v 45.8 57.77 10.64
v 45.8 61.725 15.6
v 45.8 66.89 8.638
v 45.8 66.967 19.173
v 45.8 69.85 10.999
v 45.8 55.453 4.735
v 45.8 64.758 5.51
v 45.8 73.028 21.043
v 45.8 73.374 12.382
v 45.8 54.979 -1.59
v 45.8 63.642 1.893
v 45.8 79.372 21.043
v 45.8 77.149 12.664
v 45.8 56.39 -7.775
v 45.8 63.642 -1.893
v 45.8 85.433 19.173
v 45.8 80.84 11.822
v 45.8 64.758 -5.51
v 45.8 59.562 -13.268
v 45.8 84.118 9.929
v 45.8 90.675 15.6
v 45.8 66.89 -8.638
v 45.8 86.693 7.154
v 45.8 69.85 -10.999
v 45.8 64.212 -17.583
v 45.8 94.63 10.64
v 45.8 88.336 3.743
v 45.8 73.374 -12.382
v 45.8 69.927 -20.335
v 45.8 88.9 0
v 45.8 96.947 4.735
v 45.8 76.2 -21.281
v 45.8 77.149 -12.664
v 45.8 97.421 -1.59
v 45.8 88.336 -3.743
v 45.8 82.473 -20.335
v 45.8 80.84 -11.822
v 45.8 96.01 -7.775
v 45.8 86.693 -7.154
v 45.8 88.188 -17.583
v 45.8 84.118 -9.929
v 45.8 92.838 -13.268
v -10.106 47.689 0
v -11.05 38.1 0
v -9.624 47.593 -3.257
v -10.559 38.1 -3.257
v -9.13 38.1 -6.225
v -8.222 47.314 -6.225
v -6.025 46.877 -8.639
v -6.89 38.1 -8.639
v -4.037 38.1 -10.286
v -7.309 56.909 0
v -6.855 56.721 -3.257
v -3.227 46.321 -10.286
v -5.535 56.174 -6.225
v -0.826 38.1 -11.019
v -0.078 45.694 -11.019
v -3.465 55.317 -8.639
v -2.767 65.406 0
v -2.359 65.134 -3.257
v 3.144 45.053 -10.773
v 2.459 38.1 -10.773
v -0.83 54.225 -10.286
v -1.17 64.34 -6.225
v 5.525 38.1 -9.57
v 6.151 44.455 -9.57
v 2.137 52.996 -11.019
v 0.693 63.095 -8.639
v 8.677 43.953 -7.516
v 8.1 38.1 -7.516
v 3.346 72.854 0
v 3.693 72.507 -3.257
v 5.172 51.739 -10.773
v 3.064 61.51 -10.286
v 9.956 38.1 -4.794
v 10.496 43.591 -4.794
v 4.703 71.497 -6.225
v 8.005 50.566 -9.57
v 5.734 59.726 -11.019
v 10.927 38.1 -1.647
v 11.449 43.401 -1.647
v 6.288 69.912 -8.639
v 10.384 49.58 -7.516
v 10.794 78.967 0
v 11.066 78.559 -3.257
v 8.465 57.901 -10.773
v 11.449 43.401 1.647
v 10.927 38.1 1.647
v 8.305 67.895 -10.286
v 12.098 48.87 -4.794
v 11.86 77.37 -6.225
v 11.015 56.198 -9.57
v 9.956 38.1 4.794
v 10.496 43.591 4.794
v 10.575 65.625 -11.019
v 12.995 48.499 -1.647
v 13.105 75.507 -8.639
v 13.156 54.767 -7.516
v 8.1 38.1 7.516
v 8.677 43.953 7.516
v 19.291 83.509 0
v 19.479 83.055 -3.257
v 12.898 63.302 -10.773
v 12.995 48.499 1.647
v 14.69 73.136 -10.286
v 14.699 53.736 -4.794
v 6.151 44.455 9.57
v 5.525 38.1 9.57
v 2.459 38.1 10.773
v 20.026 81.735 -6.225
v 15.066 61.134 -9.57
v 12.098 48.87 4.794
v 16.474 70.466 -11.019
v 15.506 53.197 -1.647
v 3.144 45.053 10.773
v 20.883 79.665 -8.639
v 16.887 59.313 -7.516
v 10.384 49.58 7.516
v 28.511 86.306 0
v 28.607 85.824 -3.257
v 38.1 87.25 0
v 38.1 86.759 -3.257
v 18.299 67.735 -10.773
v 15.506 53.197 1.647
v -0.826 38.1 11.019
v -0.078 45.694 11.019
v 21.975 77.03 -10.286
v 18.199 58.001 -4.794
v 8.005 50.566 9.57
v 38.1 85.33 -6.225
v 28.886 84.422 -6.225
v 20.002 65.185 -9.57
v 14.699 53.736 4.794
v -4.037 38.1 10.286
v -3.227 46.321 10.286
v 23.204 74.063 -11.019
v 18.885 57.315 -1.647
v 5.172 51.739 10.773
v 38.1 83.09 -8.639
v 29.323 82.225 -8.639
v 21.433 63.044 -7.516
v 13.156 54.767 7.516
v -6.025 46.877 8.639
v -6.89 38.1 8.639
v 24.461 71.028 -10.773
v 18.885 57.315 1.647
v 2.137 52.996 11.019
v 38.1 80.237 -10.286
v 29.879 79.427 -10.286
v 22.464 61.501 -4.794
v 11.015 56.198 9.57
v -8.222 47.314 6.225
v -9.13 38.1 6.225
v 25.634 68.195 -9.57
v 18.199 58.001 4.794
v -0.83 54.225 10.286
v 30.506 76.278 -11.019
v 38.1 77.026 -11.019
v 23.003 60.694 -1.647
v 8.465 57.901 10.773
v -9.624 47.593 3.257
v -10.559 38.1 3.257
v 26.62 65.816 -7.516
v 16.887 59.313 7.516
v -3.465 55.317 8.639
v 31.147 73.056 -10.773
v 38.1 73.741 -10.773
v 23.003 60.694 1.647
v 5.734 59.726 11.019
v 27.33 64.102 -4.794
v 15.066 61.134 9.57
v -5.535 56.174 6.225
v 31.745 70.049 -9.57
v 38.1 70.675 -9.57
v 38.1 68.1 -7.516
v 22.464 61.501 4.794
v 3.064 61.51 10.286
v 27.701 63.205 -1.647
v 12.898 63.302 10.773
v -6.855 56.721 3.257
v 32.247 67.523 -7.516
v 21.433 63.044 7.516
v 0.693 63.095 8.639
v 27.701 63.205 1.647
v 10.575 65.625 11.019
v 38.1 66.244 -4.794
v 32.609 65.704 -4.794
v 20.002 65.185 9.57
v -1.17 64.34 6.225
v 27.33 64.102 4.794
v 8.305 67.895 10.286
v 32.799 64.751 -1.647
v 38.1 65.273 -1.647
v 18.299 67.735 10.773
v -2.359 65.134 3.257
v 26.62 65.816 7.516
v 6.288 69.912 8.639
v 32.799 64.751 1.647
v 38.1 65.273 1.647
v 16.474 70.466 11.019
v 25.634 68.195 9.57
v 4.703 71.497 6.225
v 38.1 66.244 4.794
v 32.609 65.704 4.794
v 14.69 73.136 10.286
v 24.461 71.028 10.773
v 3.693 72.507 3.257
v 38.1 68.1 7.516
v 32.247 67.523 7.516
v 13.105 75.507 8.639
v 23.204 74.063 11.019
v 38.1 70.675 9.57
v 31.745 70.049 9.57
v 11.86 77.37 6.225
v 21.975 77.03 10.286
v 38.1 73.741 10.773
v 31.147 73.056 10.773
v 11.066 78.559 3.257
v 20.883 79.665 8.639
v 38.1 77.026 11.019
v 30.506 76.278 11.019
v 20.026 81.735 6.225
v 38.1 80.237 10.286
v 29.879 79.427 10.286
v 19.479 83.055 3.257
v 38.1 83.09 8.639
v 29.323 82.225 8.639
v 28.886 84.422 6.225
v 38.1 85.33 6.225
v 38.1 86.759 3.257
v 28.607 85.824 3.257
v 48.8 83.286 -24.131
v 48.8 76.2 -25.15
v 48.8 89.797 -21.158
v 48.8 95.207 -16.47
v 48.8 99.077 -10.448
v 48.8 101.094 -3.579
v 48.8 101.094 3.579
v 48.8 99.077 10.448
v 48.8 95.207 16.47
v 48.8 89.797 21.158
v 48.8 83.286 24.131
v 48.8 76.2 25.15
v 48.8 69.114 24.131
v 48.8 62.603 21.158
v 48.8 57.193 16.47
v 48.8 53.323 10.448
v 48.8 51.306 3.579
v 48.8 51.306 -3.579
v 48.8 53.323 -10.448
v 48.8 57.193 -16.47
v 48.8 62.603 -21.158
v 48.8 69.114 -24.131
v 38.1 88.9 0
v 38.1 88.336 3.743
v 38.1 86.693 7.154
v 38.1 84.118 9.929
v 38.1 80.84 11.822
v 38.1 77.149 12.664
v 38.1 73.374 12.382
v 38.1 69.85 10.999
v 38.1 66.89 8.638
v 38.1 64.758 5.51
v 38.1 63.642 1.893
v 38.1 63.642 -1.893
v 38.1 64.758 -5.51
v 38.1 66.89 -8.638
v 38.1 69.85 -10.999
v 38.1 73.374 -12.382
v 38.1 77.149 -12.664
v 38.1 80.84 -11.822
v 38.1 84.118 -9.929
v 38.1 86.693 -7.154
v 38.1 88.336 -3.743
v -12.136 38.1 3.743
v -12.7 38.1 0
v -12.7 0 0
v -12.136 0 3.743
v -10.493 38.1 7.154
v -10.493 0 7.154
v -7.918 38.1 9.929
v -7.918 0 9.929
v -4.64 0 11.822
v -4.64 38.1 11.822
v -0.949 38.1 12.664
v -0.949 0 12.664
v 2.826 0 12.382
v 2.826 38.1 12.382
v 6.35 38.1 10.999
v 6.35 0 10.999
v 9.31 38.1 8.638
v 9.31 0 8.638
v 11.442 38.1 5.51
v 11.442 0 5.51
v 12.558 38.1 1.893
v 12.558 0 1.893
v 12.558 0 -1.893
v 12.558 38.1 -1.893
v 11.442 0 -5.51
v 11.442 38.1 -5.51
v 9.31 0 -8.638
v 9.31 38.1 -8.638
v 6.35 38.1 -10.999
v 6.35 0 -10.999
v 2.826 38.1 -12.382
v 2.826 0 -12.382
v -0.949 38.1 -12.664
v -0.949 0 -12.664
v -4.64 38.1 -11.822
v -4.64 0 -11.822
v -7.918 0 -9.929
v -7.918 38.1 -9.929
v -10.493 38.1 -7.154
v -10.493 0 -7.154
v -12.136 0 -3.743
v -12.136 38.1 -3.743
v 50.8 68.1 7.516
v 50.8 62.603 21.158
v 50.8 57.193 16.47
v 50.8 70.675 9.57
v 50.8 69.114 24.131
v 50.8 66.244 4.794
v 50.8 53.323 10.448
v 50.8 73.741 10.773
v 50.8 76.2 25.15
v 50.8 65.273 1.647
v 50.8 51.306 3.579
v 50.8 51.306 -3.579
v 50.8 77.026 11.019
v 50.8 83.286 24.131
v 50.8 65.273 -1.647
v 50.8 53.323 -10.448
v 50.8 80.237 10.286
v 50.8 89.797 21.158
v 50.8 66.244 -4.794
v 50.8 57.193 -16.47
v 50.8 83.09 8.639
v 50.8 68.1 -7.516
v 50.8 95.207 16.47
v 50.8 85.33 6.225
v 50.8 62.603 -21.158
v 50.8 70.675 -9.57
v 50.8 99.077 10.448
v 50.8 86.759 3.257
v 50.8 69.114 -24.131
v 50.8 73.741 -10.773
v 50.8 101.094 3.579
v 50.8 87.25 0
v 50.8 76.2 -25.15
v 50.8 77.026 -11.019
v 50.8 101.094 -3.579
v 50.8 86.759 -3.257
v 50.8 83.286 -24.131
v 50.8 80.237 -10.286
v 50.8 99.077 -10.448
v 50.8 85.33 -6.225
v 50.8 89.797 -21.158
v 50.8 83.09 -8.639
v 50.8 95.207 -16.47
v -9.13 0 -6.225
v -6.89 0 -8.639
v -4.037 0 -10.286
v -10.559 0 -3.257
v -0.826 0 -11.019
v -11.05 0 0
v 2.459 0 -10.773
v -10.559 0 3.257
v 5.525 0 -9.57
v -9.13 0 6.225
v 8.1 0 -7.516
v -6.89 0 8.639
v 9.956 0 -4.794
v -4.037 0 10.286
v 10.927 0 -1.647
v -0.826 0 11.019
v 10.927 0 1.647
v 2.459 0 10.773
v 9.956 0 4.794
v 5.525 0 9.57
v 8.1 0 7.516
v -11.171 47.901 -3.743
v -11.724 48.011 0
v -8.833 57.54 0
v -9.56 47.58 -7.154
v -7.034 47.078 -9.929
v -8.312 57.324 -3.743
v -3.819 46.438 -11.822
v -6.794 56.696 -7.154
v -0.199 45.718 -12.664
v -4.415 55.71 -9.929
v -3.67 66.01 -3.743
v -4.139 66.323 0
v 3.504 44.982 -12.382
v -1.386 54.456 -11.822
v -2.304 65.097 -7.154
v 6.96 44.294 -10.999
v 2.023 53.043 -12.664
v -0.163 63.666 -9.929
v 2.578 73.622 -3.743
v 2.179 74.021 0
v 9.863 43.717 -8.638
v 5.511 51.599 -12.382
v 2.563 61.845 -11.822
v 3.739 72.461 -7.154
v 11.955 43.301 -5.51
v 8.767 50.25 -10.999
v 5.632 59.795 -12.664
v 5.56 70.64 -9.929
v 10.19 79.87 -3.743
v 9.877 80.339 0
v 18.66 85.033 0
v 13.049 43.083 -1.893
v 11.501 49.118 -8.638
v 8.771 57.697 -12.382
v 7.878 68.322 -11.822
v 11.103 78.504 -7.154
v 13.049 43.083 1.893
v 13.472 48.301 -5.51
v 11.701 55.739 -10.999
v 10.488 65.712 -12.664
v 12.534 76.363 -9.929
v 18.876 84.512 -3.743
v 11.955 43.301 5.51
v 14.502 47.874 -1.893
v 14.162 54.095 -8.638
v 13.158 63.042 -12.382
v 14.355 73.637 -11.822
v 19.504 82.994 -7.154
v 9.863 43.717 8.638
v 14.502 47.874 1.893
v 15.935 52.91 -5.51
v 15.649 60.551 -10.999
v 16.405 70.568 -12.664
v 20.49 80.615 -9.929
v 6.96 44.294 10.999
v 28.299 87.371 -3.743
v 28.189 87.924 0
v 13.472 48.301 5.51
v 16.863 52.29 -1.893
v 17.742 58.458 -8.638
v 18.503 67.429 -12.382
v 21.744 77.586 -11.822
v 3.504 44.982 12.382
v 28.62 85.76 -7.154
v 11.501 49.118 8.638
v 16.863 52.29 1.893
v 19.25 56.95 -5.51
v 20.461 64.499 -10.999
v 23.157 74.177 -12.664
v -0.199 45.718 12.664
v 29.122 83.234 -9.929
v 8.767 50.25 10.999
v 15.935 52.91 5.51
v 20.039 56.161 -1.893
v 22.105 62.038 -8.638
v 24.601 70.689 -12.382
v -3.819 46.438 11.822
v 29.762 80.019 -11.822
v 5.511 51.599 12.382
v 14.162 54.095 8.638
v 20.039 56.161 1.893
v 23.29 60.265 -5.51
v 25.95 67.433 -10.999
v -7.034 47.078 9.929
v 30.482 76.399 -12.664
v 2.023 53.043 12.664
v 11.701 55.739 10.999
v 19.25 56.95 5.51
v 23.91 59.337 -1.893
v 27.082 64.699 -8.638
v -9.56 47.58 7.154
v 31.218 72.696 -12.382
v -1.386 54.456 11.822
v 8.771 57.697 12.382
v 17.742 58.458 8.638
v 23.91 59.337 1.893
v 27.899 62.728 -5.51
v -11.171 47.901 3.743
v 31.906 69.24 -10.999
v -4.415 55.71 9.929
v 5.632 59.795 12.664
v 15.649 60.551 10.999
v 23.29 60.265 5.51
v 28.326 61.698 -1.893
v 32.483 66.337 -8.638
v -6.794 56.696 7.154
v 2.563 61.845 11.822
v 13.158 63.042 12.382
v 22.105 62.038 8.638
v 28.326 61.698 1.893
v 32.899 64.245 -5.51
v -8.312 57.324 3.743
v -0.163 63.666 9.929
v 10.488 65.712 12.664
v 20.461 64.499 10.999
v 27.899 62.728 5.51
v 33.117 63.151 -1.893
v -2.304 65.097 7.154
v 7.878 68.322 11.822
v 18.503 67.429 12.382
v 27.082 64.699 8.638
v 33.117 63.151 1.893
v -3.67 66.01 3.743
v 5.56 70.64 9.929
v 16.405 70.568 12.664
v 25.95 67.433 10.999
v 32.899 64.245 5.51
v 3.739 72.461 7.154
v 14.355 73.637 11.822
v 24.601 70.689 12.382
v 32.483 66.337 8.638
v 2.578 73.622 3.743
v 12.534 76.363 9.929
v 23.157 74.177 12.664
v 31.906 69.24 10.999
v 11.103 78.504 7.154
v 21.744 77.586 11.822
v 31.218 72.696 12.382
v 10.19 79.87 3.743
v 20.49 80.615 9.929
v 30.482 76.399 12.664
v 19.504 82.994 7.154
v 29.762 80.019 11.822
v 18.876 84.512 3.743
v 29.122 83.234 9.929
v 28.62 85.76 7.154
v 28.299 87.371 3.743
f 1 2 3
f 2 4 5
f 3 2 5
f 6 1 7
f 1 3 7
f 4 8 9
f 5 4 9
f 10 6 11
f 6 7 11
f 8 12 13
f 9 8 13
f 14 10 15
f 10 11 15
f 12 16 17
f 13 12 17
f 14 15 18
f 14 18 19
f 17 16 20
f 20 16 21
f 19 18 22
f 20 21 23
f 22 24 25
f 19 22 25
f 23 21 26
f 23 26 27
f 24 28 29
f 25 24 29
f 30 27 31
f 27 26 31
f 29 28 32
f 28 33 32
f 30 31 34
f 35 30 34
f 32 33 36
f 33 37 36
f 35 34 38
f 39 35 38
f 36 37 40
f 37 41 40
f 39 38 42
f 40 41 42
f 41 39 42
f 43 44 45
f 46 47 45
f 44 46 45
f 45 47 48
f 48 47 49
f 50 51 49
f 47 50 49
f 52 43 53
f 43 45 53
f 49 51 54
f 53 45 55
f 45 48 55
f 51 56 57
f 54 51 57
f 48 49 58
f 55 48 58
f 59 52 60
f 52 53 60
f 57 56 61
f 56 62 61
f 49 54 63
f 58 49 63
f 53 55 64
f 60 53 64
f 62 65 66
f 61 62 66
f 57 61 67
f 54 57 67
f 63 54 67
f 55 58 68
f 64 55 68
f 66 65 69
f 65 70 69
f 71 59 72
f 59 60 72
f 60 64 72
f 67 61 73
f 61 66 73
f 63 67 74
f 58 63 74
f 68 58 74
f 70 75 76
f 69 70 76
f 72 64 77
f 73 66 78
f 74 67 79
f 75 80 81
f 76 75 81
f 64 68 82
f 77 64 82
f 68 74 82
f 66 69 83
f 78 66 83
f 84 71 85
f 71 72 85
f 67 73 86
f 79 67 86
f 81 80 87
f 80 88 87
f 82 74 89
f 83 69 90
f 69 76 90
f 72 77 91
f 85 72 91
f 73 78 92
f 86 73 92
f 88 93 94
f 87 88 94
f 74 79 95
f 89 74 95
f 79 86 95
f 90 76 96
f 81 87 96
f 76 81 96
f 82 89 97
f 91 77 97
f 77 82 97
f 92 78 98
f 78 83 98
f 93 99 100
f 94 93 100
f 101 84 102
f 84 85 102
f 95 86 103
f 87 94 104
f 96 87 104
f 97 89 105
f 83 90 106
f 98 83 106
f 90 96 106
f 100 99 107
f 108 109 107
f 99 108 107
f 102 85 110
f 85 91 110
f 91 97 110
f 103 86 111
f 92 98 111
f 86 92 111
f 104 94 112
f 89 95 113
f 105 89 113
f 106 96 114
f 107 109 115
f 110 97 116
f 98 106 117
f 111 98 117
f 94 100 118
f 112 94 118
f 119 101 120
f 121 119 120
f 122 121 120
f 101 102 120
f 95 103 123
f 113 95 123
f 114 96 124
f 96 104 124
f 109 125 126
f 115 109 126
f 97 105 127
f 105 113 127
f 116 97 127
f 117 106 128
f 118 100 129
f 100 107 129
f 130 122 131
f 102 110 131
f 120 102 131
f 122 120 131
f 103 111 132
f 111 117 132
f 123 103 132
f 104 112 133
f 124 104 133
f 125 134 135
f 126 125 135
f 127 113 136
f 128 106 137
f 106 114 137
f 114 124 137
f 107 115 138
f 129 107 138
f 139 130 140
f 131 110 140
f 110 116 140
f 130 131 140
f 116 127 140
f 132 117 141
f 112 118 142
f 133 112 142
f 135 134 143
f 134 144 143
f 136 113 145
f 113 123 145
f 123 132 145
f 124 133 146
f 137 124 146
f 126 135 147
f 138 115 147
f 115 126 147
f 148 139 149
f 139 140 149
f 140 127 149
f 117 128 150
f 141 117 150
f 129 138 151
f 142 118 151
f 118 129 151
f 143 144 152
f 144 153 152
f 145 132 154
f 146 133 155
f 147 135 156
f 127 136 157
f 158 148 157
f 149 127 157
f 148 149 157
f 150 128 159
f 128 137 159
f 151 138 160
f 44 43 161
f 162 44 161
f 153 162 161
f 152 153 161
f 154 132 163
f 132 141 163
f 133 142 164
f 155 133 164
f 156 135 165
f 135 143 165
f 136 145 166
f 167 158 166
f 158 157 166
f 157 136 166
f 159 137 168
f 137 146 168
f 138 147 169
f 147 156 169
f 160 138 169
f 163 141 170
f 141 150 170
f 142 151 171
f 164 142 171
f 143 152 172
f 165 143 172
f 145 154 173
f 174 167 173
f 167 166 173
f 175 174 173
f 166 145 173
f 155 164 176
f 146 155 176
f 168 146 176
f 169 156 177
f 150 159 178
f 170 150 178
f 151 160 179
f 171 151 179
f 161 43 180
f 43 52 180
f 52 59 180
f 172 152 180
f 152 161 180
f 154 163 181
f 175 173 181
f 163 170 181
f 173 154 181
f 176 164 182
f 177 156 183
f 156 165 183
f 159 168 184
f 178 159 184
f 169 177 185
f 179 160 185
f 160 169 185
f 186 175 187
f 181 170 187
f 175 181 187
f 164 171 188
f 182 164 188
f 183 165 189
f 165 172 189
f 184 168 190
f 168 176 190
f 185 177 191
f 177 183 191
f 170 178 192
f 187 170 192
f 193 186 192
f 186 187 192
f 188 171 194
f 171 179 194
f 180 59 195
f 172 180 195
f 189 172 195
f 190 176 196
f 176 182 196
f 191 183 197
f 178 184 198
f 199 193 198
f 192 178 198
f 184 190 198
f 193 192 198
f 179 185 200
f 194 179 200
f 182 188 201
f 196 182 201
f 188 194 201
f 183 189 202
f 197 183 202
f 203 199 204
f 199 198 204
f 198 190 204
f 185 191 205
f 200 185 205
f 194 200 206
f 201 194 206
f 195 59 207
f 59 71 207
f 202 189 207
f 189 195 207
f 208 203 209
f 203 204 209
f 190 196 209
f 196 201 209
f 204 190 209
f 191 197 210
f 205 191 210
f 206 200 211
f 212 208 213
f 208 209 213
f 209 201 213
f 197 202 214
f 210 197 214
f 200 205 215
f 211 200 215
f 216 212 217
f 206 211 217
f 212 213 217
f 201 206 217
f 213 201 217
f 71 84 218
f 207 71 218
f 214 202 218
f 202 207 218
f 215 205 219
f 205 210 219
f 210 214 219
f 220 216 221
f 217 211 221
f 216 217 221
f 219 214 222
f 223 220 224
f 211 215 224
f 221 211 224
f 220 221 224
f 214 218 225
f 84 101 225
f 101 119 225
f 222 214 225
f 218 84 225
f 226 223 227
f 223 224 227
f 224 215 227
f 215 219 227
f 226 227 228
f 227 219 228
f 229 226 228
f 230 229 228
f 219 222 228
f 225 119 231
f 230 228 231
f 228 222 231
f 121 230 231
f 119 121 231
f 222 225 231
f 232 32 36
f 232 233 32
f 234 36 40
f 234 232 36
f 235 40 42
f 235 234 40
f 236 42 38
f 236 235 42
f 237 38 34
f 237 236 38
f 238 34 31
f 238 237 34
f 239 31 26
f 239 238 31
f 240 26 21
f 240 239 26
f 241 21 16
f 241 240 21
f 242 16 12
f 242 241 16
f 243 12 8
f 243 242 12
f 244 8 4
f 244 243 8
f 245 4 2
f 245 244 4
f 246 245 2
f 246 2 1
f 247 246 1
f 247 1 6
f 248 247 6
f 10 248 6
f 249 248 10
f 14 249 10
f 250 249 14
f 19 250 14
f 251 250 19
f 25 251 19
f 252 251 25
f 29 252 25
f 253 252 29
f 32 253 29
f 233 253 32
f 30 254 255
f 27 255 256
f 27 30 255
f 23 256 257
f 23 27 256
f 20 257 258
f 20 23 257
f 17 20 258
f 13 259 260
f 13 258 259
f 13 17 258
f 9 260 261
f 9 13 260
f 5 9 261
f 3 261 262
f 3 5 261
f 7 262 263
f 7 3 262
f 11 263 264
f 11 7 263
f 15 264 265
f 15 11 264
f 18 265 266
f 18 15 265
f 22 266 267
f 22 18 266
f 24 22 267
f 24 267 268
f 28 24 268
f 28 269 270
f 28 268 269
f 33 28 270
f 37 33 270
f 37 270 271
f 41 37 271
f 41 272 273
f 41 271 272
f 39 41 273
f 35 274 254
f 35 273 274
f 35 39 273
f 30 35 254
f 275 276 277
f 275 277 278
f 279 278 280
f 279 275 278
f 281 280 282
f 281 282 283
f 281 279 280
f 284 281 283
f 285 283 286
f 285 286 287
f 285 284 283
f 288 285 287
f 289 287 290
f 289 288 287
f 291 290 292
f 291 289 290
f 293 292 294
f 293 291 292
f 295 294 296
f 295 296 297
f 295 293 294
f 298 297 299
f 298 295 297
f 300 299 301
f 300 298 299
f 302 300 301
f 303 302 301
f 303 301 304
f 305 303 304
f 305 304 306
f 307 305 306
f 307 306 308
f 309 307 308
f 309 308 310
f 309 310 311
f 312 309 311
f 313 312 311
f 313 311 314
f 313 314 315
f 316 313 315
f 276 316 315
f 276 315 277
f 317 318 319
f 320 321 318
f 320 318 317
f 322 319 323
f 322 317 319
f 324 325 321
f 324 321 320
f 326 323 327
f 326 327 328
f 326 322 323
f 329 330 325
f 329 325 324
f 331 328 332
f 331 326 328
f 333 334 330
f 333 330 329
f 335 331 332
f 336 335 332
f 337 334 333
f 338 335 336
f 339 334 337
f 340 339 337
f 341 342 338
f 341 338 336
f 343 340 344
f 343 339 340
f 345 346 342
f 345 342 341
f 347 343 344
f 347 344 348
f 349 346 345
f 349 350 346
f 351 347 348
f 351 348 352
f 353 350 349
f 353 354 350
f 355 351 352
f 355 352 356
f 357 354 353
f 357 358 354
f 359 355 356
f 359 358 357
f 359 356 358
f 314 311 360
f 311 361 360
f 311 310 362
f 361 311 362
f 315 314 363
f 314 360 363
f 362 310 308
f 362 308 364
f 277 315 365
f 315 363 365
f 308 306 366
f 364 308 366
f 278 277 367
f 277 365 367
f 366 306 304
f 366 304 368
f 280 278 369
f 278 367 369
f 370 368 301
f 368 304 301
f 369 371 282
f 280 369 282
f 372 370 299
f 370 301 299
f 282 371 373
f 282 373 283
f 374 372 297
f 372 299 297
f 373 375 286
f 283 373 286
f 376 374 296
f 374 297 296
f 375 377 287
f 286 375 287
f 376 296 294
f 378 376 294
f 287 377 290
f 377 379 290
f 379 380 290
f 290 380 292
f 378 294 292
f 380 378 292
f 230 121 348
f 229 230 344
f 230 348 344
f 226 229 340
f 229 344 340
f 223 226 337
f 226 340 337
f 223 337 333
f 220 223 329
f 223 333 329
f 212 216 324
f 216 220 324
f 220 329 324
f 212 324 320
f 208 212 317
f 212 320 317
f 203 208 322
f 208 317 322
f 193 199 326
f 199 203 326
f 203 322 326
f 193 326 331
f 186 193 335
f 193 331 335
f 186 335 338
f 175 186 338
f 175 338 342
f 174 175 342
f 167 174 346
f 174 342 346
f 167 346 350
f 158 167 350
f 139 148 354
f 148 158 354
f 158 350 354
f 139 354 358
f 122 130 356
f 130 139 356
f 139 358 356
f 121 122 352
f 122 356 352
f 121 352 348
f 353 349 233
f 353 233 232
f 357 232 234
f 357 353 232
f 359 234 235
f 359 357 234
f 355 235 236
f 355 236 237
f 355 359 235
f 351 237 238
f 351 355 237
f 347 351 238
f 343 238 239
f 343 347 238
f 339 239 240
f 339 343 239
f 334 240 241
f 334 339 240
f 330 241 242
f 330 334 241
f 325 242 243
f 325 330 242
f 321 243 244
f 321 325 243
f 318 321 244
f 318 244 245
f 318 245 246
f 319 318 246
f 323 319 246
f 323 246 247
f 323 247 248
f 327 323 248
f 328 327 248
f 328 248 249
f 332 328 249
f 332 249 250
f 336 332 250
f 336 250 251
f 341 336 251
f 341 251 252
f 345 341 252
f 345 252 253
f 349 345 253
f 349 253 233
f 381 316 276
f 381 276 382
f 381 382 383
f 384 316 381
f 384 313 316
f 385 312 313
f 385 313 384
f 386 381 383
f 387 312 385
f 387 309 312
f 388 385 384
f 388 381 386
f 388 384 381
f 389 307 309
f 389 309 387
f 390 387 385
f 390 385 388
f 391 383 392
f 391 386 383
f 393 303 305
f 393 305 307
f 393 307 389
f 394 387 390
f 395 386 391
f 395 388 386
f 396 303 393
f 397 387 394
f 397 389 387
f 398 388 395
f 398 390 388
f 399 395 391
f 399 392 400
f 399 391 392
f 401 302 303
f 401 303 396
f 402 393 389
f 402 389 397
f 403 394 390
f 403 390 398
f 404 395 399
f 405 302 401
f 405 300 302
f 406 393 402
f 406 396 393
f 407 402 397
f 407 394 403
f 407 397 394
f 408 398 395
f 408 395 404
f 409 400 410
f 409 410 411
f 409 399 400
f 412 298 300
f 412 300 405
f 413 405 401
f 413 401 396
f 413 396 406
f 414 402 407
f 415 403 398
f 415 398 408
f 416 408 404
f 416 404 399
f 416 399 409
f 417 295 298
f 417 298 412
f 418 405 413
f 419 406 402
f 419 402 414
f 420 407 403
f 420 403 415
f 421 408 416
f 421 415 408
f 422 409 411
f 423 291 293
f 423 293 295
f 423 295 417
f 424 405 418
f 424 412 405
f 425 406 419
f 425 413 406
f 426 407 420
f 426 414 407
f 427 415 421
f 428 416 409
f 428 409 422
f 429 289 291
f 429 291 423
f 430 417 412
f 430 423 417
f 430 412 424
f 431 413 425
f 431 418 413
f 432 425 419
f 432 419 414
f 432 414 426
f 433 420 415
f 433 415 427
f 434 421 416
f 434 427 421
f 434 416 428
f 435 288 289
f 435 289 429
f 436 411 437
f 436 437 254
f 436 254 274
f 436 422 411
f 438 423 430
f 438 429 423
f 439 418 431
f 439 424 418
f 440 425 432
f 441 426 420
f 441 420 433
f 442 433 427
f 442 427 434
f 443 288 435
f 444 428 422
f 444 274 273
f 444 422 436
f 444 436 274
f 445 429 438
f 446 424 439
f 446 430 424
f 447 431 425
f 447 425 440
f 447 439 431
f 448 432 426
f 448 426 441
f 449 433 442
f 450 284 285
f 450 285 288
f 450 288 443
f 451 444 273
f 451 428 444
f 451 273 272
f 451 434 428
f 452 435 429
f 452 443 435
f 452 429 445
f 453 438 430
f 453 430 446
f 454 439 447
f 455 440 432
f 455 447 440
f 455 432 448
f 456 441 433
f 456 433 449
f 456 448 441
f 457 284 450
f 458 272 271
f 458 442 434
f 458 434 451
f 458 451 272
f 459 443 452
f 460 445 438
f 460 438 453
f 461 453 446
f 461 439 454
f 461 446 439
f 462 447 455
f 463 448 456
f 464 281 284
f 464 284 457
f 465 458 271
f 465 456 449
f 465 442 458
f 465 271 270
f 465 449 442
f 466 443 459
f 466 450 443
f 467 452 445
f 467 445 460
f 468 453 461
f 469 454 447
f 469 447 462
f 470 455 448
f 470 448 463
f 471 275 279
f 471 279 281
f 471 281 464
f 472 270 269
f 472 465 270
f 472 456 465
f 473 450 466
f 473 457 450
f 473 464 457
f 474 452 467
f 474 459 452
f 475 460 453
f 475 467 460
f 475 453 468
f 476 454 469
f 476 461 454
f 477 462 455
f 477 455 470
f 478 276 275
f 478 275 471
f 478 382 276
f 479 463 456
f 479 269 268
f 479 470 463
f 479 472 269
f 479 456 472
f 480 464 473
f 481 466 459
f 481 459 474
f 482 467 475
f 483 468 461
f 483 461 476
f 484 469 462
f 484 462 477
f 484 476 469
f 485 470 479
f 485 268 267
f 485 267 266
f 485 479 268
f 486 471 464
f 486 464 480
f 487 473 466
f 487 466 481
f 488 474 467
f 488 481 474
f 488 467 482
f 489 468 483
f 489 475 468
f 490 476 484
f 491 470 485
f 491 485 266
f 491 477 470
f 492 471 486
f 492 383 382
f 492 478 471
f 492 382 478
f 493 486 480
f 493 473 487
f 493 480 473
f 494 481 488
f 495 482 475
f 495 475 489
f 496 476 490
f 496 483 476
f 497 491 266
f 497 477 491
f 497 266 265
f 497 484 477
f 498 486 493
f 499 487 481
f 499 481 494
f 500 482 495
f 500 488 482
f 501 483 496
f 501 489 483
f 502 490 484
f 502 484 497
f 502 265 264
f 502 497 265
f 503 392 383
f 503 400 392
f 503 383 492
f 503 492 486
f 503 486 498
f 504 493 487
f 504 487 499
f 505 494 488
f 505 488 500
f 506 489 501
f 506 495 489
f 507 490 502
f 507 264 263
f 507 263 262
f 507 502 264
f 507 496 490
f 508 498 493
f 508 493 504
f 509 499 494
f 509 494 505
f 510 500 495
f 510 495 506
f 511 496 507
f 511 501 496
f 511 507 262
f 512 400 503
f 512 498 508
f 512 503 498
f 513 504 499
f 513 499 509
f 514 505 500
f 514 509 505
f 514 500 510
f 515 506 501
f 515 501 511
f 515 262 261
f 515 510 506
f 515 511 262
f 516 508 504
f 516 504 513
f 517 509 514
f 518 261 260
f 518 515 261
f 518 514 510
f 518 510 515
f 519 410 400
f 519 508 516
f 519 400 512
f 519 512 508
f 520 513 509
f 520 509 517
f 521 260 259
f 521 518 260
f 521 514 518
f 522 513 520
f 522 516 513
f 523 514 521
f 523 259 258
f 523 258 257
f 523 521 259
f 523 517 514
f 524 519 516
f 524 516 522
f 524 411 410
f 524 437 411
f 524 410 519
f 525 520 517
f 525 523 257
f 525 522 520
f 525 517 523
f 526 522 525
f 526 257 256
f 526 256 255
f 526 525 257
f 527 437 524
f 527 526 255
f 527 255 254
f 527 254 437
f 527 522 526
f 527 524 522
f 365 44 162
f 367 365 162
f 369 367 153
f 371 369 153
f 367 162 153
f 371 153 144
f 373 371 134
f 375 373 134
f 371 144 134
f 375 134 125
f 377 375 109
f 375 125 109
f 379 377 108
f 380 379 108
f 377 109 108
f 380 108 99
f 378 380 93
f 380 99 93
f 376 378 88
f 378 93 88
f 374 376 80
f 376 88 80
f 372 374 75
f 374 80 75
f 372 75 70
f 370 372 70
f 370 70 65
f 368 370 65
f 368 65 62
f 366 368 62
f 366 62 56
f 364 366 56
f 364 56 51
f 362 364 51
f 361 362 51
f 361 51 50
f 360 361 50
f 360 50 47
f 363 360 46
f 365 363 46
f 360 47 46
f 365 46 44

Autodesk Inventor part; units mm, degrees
ref_plane "YZ Plane" through (0, 0, 0) normal (1, 0, 0) x (0, 1, 0)
ref_plane "XZ Plane" through (0, 0, 0) normal (0, 1, 0) x (-1, 0, 0)
ref_plane "XY Plane" through (0, 0, 0) normal (0, 0, 1) x (1, 0, 0)
sketch "Sketch1" plane through (0, 0, 0) normal (0, 0, 1) x (1, 0, 0)
  line L0 (0, 0) -> (0, 38.1)
  line L1 (38.1, 76.2) -> (50.8, 76.2)
  arc A0 (38.1, 76.2) -> (0, 38.1) centre (38.1, 38.1) ccw
  dimension "d1" = 76.2
  dimension "d2" = 50.8
  dimension "d4" = 38.1
sketch "Sketch2" plane through (0, 0, 0) normal (0, 1, 0) x (-1, 0, 0)
  circle A0 centre (0, 0) radius 12.7
  circle A1 centre (0, 0) radius 11.05
  dimension "d3" = 25.4
  dimension "d11" = 1.65
sweep "Sweep1" add profiles "Sketch2" path "Sketch1"
sketch "Sketch3" plane through (50.8, 76.2, 0) normal (1, 0, 0) x (0, 0, -1)
  circle A0 centre (0, 0) radius 12.7 projected
  circle A1 centre (0, 0) radius 25.15
  point P0 (0, -76.2)
  dimension "d6" = 50.3
extrude "Extrusion1" add sketch "Sketch3" against normal blind 5
chamfer "Chamfer1" distance 3 distance2 3.8692 1 edges at (45.8, 76.2, 25.15) measured on face at (47.4667, 72.1657, -24.8243)
equation "\"d4\" = 0.75 * d2"
equation "\"d15\" = 0.0769231 * d6"
properties part number "Ferrule 90 deg Elb-25.4"
